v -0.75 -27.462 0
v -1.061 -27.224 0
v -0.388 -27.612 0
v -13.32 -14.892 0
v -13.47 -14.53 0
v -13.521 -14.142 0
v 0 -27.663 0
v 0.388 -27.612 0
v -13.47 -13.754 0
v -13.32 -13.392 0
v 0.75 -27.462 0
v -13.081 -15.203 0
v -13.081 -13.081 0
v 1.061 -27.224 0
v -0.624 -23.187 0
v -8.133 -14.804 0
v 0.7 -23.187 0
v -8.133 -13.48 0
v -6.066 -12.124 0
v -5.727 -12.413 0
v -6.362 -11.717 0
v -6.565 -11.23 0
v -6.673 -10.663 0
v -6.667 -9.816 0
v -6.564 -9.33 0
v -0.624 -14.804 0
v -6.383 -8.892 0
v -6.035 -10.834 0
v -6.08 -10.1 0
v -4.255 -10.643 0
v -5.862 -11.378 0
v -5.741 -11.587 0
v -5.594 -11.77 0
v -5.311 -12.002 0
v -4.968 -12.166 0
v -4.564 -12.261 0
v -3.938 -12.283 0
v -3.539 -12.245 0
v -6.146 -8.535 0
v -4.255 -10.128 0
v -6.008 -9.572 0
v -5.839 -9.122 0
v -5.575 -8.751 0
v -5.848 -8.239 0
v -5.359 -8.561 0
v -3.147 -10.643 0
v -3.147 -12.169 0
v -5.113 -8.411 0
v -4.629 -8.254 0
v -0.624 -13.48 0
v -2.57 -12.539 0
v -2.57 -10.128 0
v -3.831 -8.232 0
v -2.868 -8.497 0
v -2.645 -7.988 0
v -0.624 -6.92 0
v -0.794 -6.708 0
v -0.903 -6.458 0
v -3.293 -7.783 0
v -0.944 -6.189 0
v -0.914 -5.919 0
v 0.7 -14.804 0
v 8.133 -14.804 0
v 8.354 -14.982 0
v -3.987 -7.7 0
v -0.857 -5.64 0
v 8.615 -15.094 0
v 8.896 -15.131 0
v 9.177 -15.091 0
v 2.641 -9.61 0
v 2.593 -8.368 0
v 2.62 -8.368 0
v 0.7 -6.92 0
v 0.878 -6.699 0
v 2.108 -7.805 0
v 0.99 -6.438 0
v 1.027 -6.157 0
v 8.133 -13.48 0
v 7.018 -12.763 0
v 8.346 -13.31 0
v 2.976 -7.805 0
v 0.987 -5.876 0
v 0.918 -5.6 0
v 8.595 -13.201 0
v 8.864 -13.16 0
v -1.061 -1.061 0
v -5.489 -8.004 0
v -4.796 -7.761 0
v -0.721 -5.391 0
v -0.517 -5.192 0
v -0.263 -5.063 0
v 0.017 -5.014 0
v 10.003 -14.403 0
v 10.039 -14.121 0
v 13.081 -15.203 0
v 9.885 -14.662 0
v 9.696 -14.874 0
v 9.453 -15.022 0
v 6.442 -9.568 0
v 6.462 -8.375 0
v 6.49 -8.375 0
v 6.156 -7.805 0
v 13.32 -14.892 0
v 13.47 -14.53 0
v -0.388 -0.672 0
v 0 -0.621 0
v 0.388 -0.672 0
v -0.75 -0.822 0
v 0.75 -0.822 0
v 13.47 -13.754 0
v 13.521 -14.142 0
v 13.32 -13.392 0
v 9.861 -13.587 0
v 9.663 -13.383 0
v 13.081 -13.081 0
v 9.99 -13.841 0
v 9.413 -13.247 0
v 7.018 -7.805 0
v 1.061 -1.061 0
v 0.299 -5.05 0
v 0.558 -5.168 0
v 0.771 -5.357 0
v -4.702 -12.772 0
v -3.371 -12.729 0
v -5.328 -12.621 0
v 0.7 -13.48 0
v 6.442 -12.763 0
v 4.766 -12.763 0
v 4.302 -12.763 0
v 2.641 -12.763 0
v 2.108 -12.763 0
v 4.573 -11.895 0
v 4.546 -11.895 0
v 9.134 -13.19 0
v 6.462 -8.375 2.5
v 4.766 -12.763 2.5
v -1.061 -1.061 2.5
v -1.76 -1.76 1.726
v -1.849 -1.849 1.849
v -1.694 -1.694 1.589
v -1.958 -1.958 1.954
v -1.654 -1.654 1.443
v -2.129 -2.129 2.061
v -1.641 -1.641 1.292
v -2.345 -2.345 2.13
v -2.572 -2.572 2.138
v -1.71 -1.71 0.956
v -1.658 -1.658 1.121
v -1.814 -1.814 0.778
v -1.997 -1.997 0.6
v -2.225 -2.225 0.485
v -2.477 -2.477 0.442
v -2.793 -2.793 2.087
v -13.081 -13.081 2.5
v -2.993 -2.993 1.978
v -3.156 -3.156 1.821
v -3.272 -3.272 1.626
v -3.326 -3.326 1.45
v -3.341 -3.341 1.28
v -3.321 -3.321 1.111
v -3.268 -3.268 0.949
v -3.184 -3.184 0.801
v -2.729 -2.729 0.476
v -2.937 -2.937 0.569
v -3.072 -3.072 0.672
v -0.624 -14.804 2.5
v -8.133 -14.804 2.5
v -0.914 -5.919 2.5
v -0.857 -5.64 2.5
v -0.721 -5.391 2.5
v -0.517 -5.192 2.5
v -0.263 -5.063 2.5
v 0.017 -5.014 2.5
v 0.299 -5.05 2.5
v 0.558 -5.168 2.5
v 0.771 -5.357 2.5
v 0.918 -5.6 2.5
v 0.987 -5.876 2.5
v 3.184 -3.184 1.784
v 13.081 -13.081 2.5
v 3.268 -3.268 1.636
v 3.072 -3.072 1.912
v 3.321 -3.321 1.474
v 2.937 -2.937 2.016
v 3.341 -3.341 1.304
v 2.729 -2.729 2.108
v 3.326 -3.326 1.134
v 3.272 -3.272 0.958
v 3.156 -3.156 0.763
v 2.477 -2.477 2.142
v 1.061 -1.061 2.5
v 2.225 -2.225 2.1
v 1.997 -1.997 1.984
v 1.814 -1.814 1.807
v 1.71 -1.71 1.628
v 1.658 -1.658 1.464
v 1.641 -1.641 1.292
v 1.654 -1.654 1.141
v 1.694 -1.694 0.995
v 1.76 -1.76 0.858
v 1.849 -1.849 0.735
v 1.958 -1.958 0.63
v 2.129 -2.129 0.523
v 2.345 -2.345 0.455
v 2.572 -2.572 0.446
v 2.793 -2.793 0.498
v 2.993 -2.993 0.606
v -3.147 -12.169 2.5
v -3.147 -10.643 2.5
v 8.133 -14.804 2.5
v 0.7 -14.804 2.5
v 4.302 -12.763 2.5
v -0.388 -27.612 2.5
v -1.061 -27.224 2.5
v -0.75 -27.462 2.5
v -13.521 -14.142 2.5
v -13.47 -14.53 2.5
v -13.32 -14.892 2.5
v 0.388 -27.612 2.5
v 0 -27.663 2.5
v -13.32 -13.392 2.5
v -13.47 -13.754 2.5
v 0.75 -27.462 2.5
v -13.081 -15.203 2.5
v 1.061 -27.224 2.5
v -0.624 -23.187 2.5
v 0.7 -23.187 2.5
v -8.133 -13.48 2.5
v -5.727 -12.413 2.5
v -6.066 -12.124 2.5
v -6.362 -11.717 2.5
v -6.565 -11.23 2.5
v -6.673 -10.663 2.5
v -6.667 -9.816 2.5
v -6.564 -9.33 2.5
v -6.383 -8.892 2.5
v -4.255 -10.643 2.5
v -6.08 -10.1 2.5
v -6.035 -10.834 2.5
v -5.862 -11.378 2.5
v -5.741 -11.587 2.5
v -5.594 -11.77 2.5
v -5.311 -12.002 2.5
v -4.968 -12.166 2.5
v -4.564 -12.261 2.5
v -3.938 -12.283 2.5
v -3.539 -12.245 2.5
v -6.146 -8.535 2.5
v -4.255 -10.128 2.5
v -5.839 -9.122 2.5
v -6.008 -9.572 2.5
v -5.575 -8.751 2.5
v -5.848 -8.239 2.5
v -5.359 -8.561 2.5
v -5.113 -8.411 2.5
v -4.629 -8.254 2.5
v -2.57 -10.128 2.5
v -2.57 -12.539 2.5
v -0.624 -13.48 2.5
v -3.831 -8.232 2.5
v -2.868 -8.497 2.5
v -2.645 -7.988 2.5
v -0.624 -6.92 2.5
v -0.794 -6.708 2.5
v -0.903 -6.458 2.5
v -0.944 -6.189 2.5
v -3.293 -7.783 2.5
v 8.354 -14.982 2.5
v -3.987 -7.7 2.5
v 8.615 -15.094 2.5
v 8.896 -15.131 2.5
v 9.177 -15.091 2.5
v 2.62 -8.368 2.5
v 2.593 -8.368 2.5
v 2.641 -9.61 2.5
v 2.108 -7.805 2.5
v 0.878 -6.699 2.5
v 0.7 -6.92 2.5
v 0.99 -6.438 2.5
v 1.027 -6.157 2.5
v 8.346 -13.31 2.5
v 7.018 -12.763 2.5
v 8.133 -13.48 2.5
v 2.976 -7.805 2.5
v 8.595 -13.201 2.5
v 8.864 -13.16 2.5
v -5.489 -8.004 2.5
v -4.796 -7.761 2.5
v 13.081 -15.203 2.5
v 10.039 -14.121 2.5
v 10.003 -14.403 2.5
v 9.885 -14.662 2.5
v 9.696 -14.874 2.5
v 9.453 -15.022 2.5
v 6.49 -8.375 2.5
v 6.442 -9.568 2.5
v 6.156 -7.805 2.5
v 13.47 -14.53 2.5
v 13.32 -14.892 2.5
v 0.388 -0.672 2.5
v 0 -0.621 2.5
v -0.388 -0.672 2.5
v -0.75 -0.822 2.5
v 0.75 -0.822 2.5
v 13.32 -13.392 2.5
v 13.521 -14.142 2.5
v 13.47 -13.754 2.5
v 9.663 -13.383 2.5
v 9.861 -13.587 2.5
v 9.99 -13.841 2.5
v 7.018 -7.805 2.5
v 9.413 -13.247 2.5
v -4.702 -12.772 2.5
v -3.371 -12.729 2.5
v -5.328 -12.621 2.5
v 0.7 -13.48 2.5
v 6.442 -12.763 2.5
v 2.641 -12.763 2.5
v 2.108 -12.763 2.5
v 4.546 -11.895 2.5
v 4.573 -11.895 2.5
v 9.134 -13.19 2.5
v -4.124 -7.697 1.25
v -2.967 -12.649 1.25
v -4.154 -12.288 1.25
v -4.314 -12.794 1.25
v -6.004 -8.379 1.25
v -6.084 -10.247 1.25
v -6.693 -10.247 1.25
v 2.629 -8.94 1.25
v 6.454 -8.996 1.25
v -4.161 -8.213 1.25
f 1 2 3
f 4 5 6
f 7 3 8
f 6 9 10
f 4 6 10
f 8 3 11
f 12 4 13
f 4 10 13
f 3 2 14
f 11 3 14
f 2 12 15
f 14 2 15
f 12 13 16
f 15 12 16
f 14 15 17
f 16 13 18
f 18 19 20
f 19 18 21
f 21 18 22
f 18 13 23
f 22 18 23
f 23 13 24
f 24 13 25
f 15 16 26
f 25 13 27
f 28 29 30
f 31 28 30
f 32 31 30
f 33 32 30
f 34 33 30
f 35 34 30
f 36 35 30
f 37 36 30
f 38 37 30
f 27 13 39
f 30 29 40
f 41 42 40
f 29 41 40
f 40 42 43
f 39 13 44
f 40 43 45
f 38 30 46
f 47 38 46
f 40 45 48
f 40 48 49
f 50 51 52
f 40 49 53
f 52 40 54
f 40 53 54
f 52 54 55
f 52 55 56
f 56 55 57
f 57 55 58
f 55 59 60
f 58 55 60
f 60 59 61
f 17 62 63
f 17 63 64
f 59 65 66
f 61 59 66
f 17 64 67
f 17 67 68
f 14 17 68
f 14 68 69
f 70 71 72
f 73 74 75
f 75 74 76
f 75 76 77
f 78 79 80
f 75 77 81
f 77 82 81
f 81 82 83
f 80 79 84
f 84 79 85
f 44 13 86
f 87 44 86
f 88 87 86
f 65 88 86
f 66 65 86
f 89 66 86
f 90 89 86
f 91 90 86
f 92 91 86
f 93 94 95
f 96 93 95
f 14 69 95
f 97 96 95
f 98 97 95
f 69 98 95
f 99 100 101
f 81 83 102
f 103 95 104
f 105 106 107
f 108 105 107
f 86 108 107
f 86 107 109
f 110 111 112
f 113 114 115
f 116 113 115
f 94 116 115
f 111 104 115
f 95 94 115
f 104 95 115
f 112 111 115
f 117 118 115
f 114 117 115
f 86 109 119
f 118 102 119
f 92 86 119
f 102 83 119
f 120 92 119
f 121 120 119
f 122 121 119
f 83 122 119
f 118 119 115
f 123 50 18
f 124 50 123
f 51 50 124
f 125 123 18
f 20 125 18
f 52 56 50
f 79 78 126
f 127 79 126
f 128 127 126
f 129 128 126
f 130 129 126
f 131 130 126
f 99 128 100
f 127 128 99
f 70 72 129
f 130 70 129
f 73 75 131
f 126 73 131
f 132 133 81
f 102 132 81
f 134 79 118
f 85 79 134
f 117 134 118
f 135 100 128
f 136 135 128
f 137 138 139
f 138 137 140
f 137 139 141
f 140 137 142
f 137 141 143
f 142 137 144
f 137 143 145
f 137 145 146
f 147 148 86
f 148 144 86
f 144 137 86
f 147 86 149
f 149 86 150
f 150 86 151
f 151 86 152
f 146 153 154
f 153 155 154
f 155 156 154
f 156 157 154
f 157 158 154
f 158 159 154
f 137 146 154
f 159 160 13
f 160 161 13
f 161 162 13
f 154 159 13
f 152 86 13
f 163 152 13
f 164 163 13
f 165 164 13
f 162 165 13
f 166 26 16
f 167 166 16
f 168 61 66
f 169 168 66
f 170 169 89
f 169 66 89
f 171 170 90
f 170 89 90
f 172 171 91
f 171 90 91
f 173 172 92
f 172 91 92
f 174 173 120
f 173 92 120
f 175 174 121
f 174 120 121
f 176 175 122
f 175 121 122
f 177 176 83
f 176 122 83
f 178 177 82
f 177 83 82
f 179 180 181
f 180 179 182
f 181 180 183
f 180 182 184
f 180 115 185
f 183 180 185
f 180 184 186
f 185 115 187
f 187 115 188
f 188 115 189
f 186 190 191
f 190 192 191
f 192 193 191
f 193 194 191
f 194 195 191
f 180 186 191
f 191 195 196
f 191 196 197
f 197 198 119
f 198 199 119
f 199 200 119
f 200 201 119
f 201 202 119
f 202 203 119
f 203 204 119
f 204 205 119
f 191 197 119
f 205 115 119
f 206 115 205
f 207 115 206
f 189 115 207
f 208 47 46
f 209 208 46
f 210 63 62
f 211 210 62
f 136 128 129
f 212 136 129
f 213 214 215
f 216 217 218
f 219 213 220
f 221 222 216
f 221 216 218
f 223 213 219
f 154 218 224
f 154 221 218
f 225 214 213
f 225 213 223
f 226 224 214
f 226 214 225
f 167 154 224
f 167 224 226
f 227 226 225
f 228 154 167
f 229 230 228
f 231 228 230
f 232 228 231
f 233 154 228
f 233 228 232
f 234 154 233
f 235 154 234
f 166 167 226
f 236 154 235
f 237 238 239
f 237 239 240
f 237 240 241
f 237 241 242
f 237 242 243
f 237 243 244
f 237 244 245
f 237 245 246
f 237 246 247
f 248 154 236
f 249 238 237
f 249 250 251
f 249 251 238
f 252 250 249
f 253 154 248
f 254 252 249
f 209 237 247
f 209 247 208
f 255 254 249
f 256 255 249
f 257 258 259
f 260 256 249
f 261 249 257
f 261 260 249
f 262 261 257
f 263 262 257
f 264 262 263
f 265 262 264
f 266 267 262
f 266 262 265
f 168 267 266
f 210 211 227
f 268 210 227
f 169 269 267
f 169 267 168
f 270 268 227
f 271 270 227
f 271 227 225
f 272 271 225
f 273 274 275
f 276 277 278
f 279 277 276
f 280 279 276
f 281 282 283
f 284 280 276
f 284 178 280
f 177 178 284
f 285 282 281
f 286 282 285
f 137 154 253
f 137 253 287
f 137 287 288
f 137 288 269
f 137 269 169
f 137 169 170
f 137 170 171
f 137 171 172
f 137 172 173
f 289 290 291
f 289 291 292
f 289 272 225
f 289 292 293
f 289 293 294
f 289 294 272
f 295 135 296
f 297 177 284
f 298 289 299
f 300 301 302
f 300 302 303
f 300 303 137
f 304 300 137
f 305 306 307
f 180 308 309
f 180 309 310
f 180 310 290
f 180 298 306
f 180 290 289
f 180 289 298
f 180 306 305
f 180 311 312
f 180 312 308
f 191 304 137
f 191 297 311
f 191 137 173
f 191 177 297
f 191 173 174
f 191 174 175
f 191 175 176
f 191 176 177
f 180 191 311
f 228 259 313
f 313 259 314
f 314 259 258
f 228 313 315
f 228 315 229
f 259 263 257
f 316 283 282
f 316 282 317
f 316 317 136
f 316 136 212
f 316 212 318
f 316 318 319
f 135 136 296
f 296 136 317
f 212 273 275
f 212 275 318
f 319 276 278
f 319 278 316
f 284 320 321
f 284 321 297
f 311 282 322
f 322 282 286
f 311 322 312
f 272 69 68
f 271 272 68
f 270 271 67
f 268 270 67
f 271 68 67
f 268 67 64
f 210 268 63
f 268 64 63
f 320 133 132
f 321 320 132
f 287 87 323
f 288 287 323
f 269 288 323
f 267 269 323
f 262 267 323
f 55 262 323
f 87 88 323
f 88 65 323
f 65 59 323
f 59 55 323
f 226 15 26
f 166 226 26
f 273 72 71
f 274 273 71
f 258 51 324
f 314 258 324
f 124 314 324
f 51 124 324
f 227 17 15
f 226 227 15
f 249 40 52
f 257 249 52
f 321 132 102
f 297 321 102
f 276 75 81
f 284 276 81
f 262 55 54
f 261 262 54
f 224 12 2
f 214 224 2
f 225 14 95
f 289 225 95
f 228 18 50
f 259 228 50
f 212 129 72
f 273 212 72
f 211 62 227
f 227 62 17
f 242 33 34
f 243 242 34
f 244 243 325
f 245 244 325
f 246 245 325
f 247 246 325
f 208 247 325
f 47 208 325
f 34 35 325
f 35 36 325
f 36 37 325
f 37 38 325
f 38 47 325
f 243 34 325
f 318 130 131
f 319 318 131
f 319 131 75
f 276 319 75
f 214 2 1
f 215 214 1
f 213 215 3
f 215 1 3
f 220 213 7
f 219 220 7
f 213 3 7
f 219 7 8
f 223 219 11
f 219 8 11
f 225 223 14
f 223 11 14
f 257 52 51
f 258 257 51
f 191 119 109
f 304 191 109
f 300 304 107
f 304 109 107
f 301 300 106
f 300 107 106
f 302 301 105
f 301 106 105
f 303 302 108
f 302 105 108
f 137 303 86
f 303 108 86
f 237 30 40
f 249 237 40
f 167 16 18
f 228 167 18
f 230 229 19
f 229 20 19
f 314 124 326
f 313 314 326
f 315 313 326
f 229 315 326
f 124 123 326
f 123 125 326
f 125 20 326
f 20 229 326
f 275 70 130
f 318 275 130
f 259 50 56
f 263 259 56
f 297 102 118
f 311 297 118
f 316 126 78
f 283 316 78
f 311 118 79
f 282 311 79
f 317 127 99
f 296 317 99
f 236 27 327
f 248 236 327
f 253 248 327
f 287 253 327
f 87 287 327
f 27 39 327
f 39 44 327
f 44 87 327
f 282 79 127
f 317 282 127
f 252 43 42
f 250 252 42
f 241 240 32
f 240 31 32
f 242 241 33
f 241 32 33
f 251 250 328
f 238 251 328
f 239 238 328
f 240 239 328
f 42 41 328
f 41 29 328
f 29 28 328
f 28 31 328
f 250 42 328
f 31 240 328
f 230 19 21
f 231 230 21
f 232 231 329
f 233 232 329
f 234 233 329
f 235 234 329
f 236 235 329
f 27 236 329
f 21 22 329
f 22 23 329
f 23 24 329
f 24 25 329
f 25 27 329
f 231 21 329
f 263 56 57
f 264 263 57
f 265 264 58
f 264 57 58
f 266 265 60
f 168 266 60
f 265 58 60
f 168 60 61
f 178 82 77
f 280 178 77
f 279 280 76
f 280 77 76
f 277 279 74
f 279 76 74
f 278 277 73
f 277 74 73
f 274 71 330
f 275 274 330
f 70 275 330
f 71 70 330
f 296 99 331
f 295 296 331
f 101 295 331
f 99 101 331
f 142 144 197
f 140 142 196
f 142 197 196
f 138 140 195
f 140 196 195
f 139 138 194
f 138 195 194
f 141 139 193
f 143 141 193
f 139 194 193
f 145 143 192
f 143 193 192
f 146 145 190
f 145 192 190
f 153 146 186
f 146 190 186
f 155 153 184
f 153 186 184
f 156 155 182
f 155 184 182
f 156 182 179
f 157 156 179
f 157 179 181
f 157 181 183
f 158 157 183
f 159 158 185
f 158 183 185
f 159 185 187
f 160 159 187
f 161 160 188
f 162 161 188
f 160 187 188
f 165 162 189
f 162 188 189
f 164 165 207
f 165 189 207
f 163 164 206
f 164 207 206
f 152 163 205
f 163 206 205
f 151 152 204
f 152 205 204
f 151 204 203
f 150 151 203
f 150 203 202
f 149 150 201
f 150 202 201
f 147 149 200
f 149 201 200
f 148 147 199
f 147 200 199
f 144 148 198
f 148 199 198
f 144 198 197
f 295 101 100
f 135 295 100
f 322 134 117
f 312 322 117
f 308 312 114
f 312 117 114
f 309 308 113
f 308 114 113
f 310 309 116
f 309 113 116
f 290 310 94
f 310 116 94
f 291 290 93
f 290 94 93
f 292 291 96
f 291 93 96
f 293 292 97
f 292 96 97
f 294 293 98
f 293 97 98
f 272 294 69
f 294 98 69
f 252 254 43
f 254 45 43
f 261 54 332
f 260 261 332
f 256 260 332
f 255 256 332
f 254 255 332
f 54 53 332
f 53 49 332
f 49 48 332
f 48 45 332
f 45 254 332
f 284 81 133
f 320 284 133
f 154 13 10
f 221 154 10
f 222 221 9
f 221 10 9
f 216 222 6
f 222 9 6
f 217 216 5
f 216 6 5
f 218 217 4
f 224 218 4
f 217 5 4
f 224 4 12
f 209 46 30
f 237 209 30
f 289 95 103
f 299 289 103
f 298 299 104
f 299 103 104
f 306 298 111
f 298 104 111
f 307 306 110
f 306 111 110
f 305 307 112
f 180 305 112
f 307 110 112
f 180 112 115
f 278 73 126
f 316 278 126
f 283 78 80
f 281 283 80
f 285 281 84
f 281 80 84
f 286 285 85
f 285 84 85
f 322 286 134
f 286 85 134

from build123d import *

# Parameters (mm, degrees)
F1_DEPTH = 2.5
F2_R     = 0.85
F3_DEPTH = 12.5


with BuildPart() as f1:
    # F0 (on Top) → F1 (new body)
    with BuildSketch(Plane.XY):
        with BuildLine():
            Line((13.081475452, -13.081475452), (1.0606601718, -1.0606601718))
            ThreePointArc((1.0606601718, -1.0606601718), (0, -0.6213203436), (-1.0606601718, -1.0606601718))
            Line((-1.0606601718, -1.0606601718), (-13.081475452, -13.081475452))
            ThreePointArc((-13.081475452, -13.081475452), (-13.5208152802, -14.1421356237), (-13.081475452, -15.2027957955))
            Line((-13.081475452, -15.2027957955), (-1.0606601718, -27.2236110757))
            ThreePointArc((-1.0606601718, -27.2236110757), (0, -27.6629509039), (1.0606601718, -27.2236110757))
            Line((1.0606601718, -27.2236110757), (13.081475452, -15.2027957955))
            ThreePointArc((13.081475452, -15.2027957955), (13.5208152802, -14.1421356237), (13.081475452, -13.081475452))
        make_face()
        with BuildLine():
            Line((-4.2551746457, -10.6432923429), (-4.2551746457, -10.1278843568))
            Line((-4.2551746457, -10.1278843568), (-2.5700617985, -10.1278843568))
            Line((-2.5700617985, -10.1278843568), (-2.5700617985, -12.5389086623))
            add(Edge.make_bspline(
                [(-2.5700617985, -12.5389086623), (-2.9639420069, -12.6647767179), (-3.3708430485, -12.7293383498)],
                knots=[0, 0, 0, 1, 1, 1], degree=2))
            add(Edge.make_bspline(
                [(-3.3708430485, -12.7293383498), (-3.7777440902, -12.7938999818), (-4.3137683957, -12.7938999818)],
                knots=[0, 0, 0, 1, 1, 1], degree=2))
            add(Edge.make_bspline(
                [(-4.3137683957, -12.7938999818), (-5.4389854096, -12.7938999818), (-6.0661555485, -12.1238695998)],
                knots=[0, 0, 0, 1, 1, 1], degree=2))
            add(Edge.make_bspline(
                [(-6.0661555485, -12.1238695998), (-6.6933256874, -11.4538392179), (-6.6933256874, -10.2472419957)],
                knots=[0, 0, 0, 1, 1, 1], degree=2))
            add(Edge.make_bspline(
                [(-6.6933256874, -10.2472419957), (-6.6933256874, -9.4735874818), (-6.3829958263, -8.8919902595)],
                knots=[0, 0, 0, 1, 1, 1], degree=2))
            add(Edge.make_bspline(
                [(-6.3829958263, -8.8919902595), (-6.0726659652, -8.3103930373), (-5.4894411388, -8.0038609193)],
                knots=[0, 0, 0, 1, 1, 1], degree=2))
            add(Edge.make_bspline(
                [(-5.4894411388, -8.0038609193), (-4.9062163124, -7.6973288012), (-4.123881243, -7.6973288012)],
                knots=[0, 0, 0, 1, 1, 1], degree=2))
            add(Edge.make_bspline(
                [(-4.123881243, -7.6973288012), (-3.3296104096, -7.6973288012), (-2.6449315902, -7.9881274123)],
                knots=[0, 0, 0, 1, 1, 1], degree=2))
            Line((-2.6449315902, -7.9881274123), (-2.8684558957, -8.4970249818))
            add(Edge.make_bspline(
                [(-2.8684558957, -8.4970249818), (-3.5401138819, -8.2127367873), (-4.1607736041, -8.2127367873)],
                knots=[0, 0, 0, 1, 1, 1], degree=2))
            add(Edge.make_bspline(
                [(-4.1607736041, -8.2127367873), (-5.0657215207, -8.2127367873), (-5.5746190902, -8.7514737665)],
                knots=[0, 0, 0, 1, 1, 1], degree=2))
            add(Edge.make_bspline(
                [(-5.5746190902, -8.7514737665), (-6.0835166596, -9.2902107457), (-6.0835166596, -10.2472419957)],
                knots=[0, 0, 0, 1, 1, 1], degree=2))
            add(Edge.make_bspline(
                [(-6.0835166596, -10.2472419957), (-6.0835166596, -11.2509312318), (-5.5936078055, -11.7695944262)],
                knots=[0, 0, 0, 1, 1, 1], degree=2))
            add(Edge.make_bspline(
                [(-5.5936078055, -11.7695944262), (-5.1036989513, -12.2882576207), (-4.1542631874, -12.2882576207)],
                knots=[0, 0, 0, 1, 1, 1], degree=2))
            add(Edge.make_bspline(
                [(-4.1542631874, -12.2882576207), (-3.6388552013, -12.2882576207), (-3.147318743, -12.1688999818)],
                knots=[0, 0, 0, 1, 1, 1], degree=2))
            Line((-3.147318743, -12.1688999818), (-3.147318743, -10.6432923429))
            Line((-3.147318743, -10.6432923429), (-4.2551746457, -10.6432923429))
        make_face(mode=Mode.SUBTRACT)
        with BuildLine():
            Line((-8.1334756687, -14.8039748892), (-8.1334756687, -13.4802963582))
            Line((-8.1334756687, -13.4802963582), (-0.6236797201, -13.4802963582))
            Line((-0.6236797201, -13.4802963582), (-0.6236797201, -6.9198086858))
            ThreePointArc((-0.6236797201, -6.9198086858), (-0.9032194318, -6.4583786209), (-0.9135835525, -5.9189782686))
            ThreePointArc((-0.9135835525, -5.9189782686), (0.0168397474, -5.0141534426), (0.9868078824, -5.876451129))
            ThreePointArc((0.9868078824, -5.876451129), (0.9900106564, -6.4384308628), (0.6999988109, -6.9198086858))
            Line((0.6999988109, -6.9198086858), (0.6999988109, -13.4802963582))
            Line((0.6999988109, -13.4802963582), (8.1334756687, -13.4802963582))
            ThreePointArc((8.1334756687, -13.4802963582), (8.5949057336, -13.2007566465), (9.134306086, -13.1903925258))
            ThreePointArc((9.134306086, -13.1903925258), (10.0391309119, -14.1208158258), (9.1768332255, -15.0907839607))
            ThreePointArc((9.1768332255, -15.0907839607), (8.6148534917, -15.0939867347), (8.1334756687, -14.8039748892))
            Line((8.1334756687, -14.8039748892), (0.6999988109, -14.8039748892))
            Line((0.6999988109, -14.8039748892), (0.6999988109, -23.1867600232))
            Line((0.6999988109, -23.1867600232), (-0.6236797201, -23.1867600232))
            Line((-0.6236797201, -23.1867600232), (-0.6236797201, -14.8039748892))
            Line((-0.6236797201, -14.8039748892), (-8.1334756687, -14.8039748892))
        make_face(mode=Mode.SUBTRACT)
        with BuildLine():
            Line((4.7664273717, -12.7628665604), (4.3020176494, -12.7628665604))
            Line((4.3020176494, -12.7628665604), (2.6201600105, -8.3683353104))
            Line((2.6201600105, -8.3683353104), (2.5930332744, -8.3683353104))
            add(Edge.make_bspline(
                [(2.5930332744, -8.3683353104), (2.64077633, -8.8902537131), (2.64077633, -9.6096547548)],
                knots=[0, 0, 0, 1, 1, 1], degree=2))
            Line((2.64077633, -9.6096547548), (2.64077633, -12.7628665604))
            Line((2.64077633, -12.7628665604), (2.1080072328, -12.7628665604))
            Line((2.1080072328, -12.7628665604), (2.1080072328, -7.8051842687))
            Line((2.1080072328, -7.8051842687), (2.9760627883, -7.8051842687))
            Line((2.9760627883, -7.8051842687), (4.5461582744, -11.8948110048))
            Line((4.5461582744, -11.8948110048), (4.5732850105, -11.8948110048))
            Line((4.5732850105, -11.8948110048), (6.15640133, -7.8051842687))
            Line((6.15640133, -7.8051842687), (7.0179464689, -7.8051842687))
            Line((7.0179464689, -7.8051842687), (7.0179464689, -12.7628665604))
            Line((7.0179464689, -12.7628665604), (6.4417745939, -12.7628665604))
            Line((6.4417745939, -12.7628665604), (6.4417745939, -9.5684221159))
            add(Edge.make_bspline(
                [(6.4417745939, -9.5684221159), (6.4417745939, -9.019376977), (6.4895176494, -8.374845727)],
                knots=[0, 0, 0, 1, 1, 1], degree=2))
            Line((6.4895176494, -8.374845727), (6.4623909133, -8.374845727))
            Line((6.4623909133, -8.374845727), (4.7664273717, -12.7628665604))
        make_face(mode=Mode.SUBTRACT)
    extrude(amount=F1_DEPTH)

    # F2 (on Right) → F3 (cut, symmetric)
    with BuildSketch(Plane.YZ):
        with Locations((-2.4908210296, 1.292226194)):
            Circle(F2_R)
    extrude(amount=F3_DEPTH, both=True, mode=Mode.SUBTRACT)


solid = f1.part
